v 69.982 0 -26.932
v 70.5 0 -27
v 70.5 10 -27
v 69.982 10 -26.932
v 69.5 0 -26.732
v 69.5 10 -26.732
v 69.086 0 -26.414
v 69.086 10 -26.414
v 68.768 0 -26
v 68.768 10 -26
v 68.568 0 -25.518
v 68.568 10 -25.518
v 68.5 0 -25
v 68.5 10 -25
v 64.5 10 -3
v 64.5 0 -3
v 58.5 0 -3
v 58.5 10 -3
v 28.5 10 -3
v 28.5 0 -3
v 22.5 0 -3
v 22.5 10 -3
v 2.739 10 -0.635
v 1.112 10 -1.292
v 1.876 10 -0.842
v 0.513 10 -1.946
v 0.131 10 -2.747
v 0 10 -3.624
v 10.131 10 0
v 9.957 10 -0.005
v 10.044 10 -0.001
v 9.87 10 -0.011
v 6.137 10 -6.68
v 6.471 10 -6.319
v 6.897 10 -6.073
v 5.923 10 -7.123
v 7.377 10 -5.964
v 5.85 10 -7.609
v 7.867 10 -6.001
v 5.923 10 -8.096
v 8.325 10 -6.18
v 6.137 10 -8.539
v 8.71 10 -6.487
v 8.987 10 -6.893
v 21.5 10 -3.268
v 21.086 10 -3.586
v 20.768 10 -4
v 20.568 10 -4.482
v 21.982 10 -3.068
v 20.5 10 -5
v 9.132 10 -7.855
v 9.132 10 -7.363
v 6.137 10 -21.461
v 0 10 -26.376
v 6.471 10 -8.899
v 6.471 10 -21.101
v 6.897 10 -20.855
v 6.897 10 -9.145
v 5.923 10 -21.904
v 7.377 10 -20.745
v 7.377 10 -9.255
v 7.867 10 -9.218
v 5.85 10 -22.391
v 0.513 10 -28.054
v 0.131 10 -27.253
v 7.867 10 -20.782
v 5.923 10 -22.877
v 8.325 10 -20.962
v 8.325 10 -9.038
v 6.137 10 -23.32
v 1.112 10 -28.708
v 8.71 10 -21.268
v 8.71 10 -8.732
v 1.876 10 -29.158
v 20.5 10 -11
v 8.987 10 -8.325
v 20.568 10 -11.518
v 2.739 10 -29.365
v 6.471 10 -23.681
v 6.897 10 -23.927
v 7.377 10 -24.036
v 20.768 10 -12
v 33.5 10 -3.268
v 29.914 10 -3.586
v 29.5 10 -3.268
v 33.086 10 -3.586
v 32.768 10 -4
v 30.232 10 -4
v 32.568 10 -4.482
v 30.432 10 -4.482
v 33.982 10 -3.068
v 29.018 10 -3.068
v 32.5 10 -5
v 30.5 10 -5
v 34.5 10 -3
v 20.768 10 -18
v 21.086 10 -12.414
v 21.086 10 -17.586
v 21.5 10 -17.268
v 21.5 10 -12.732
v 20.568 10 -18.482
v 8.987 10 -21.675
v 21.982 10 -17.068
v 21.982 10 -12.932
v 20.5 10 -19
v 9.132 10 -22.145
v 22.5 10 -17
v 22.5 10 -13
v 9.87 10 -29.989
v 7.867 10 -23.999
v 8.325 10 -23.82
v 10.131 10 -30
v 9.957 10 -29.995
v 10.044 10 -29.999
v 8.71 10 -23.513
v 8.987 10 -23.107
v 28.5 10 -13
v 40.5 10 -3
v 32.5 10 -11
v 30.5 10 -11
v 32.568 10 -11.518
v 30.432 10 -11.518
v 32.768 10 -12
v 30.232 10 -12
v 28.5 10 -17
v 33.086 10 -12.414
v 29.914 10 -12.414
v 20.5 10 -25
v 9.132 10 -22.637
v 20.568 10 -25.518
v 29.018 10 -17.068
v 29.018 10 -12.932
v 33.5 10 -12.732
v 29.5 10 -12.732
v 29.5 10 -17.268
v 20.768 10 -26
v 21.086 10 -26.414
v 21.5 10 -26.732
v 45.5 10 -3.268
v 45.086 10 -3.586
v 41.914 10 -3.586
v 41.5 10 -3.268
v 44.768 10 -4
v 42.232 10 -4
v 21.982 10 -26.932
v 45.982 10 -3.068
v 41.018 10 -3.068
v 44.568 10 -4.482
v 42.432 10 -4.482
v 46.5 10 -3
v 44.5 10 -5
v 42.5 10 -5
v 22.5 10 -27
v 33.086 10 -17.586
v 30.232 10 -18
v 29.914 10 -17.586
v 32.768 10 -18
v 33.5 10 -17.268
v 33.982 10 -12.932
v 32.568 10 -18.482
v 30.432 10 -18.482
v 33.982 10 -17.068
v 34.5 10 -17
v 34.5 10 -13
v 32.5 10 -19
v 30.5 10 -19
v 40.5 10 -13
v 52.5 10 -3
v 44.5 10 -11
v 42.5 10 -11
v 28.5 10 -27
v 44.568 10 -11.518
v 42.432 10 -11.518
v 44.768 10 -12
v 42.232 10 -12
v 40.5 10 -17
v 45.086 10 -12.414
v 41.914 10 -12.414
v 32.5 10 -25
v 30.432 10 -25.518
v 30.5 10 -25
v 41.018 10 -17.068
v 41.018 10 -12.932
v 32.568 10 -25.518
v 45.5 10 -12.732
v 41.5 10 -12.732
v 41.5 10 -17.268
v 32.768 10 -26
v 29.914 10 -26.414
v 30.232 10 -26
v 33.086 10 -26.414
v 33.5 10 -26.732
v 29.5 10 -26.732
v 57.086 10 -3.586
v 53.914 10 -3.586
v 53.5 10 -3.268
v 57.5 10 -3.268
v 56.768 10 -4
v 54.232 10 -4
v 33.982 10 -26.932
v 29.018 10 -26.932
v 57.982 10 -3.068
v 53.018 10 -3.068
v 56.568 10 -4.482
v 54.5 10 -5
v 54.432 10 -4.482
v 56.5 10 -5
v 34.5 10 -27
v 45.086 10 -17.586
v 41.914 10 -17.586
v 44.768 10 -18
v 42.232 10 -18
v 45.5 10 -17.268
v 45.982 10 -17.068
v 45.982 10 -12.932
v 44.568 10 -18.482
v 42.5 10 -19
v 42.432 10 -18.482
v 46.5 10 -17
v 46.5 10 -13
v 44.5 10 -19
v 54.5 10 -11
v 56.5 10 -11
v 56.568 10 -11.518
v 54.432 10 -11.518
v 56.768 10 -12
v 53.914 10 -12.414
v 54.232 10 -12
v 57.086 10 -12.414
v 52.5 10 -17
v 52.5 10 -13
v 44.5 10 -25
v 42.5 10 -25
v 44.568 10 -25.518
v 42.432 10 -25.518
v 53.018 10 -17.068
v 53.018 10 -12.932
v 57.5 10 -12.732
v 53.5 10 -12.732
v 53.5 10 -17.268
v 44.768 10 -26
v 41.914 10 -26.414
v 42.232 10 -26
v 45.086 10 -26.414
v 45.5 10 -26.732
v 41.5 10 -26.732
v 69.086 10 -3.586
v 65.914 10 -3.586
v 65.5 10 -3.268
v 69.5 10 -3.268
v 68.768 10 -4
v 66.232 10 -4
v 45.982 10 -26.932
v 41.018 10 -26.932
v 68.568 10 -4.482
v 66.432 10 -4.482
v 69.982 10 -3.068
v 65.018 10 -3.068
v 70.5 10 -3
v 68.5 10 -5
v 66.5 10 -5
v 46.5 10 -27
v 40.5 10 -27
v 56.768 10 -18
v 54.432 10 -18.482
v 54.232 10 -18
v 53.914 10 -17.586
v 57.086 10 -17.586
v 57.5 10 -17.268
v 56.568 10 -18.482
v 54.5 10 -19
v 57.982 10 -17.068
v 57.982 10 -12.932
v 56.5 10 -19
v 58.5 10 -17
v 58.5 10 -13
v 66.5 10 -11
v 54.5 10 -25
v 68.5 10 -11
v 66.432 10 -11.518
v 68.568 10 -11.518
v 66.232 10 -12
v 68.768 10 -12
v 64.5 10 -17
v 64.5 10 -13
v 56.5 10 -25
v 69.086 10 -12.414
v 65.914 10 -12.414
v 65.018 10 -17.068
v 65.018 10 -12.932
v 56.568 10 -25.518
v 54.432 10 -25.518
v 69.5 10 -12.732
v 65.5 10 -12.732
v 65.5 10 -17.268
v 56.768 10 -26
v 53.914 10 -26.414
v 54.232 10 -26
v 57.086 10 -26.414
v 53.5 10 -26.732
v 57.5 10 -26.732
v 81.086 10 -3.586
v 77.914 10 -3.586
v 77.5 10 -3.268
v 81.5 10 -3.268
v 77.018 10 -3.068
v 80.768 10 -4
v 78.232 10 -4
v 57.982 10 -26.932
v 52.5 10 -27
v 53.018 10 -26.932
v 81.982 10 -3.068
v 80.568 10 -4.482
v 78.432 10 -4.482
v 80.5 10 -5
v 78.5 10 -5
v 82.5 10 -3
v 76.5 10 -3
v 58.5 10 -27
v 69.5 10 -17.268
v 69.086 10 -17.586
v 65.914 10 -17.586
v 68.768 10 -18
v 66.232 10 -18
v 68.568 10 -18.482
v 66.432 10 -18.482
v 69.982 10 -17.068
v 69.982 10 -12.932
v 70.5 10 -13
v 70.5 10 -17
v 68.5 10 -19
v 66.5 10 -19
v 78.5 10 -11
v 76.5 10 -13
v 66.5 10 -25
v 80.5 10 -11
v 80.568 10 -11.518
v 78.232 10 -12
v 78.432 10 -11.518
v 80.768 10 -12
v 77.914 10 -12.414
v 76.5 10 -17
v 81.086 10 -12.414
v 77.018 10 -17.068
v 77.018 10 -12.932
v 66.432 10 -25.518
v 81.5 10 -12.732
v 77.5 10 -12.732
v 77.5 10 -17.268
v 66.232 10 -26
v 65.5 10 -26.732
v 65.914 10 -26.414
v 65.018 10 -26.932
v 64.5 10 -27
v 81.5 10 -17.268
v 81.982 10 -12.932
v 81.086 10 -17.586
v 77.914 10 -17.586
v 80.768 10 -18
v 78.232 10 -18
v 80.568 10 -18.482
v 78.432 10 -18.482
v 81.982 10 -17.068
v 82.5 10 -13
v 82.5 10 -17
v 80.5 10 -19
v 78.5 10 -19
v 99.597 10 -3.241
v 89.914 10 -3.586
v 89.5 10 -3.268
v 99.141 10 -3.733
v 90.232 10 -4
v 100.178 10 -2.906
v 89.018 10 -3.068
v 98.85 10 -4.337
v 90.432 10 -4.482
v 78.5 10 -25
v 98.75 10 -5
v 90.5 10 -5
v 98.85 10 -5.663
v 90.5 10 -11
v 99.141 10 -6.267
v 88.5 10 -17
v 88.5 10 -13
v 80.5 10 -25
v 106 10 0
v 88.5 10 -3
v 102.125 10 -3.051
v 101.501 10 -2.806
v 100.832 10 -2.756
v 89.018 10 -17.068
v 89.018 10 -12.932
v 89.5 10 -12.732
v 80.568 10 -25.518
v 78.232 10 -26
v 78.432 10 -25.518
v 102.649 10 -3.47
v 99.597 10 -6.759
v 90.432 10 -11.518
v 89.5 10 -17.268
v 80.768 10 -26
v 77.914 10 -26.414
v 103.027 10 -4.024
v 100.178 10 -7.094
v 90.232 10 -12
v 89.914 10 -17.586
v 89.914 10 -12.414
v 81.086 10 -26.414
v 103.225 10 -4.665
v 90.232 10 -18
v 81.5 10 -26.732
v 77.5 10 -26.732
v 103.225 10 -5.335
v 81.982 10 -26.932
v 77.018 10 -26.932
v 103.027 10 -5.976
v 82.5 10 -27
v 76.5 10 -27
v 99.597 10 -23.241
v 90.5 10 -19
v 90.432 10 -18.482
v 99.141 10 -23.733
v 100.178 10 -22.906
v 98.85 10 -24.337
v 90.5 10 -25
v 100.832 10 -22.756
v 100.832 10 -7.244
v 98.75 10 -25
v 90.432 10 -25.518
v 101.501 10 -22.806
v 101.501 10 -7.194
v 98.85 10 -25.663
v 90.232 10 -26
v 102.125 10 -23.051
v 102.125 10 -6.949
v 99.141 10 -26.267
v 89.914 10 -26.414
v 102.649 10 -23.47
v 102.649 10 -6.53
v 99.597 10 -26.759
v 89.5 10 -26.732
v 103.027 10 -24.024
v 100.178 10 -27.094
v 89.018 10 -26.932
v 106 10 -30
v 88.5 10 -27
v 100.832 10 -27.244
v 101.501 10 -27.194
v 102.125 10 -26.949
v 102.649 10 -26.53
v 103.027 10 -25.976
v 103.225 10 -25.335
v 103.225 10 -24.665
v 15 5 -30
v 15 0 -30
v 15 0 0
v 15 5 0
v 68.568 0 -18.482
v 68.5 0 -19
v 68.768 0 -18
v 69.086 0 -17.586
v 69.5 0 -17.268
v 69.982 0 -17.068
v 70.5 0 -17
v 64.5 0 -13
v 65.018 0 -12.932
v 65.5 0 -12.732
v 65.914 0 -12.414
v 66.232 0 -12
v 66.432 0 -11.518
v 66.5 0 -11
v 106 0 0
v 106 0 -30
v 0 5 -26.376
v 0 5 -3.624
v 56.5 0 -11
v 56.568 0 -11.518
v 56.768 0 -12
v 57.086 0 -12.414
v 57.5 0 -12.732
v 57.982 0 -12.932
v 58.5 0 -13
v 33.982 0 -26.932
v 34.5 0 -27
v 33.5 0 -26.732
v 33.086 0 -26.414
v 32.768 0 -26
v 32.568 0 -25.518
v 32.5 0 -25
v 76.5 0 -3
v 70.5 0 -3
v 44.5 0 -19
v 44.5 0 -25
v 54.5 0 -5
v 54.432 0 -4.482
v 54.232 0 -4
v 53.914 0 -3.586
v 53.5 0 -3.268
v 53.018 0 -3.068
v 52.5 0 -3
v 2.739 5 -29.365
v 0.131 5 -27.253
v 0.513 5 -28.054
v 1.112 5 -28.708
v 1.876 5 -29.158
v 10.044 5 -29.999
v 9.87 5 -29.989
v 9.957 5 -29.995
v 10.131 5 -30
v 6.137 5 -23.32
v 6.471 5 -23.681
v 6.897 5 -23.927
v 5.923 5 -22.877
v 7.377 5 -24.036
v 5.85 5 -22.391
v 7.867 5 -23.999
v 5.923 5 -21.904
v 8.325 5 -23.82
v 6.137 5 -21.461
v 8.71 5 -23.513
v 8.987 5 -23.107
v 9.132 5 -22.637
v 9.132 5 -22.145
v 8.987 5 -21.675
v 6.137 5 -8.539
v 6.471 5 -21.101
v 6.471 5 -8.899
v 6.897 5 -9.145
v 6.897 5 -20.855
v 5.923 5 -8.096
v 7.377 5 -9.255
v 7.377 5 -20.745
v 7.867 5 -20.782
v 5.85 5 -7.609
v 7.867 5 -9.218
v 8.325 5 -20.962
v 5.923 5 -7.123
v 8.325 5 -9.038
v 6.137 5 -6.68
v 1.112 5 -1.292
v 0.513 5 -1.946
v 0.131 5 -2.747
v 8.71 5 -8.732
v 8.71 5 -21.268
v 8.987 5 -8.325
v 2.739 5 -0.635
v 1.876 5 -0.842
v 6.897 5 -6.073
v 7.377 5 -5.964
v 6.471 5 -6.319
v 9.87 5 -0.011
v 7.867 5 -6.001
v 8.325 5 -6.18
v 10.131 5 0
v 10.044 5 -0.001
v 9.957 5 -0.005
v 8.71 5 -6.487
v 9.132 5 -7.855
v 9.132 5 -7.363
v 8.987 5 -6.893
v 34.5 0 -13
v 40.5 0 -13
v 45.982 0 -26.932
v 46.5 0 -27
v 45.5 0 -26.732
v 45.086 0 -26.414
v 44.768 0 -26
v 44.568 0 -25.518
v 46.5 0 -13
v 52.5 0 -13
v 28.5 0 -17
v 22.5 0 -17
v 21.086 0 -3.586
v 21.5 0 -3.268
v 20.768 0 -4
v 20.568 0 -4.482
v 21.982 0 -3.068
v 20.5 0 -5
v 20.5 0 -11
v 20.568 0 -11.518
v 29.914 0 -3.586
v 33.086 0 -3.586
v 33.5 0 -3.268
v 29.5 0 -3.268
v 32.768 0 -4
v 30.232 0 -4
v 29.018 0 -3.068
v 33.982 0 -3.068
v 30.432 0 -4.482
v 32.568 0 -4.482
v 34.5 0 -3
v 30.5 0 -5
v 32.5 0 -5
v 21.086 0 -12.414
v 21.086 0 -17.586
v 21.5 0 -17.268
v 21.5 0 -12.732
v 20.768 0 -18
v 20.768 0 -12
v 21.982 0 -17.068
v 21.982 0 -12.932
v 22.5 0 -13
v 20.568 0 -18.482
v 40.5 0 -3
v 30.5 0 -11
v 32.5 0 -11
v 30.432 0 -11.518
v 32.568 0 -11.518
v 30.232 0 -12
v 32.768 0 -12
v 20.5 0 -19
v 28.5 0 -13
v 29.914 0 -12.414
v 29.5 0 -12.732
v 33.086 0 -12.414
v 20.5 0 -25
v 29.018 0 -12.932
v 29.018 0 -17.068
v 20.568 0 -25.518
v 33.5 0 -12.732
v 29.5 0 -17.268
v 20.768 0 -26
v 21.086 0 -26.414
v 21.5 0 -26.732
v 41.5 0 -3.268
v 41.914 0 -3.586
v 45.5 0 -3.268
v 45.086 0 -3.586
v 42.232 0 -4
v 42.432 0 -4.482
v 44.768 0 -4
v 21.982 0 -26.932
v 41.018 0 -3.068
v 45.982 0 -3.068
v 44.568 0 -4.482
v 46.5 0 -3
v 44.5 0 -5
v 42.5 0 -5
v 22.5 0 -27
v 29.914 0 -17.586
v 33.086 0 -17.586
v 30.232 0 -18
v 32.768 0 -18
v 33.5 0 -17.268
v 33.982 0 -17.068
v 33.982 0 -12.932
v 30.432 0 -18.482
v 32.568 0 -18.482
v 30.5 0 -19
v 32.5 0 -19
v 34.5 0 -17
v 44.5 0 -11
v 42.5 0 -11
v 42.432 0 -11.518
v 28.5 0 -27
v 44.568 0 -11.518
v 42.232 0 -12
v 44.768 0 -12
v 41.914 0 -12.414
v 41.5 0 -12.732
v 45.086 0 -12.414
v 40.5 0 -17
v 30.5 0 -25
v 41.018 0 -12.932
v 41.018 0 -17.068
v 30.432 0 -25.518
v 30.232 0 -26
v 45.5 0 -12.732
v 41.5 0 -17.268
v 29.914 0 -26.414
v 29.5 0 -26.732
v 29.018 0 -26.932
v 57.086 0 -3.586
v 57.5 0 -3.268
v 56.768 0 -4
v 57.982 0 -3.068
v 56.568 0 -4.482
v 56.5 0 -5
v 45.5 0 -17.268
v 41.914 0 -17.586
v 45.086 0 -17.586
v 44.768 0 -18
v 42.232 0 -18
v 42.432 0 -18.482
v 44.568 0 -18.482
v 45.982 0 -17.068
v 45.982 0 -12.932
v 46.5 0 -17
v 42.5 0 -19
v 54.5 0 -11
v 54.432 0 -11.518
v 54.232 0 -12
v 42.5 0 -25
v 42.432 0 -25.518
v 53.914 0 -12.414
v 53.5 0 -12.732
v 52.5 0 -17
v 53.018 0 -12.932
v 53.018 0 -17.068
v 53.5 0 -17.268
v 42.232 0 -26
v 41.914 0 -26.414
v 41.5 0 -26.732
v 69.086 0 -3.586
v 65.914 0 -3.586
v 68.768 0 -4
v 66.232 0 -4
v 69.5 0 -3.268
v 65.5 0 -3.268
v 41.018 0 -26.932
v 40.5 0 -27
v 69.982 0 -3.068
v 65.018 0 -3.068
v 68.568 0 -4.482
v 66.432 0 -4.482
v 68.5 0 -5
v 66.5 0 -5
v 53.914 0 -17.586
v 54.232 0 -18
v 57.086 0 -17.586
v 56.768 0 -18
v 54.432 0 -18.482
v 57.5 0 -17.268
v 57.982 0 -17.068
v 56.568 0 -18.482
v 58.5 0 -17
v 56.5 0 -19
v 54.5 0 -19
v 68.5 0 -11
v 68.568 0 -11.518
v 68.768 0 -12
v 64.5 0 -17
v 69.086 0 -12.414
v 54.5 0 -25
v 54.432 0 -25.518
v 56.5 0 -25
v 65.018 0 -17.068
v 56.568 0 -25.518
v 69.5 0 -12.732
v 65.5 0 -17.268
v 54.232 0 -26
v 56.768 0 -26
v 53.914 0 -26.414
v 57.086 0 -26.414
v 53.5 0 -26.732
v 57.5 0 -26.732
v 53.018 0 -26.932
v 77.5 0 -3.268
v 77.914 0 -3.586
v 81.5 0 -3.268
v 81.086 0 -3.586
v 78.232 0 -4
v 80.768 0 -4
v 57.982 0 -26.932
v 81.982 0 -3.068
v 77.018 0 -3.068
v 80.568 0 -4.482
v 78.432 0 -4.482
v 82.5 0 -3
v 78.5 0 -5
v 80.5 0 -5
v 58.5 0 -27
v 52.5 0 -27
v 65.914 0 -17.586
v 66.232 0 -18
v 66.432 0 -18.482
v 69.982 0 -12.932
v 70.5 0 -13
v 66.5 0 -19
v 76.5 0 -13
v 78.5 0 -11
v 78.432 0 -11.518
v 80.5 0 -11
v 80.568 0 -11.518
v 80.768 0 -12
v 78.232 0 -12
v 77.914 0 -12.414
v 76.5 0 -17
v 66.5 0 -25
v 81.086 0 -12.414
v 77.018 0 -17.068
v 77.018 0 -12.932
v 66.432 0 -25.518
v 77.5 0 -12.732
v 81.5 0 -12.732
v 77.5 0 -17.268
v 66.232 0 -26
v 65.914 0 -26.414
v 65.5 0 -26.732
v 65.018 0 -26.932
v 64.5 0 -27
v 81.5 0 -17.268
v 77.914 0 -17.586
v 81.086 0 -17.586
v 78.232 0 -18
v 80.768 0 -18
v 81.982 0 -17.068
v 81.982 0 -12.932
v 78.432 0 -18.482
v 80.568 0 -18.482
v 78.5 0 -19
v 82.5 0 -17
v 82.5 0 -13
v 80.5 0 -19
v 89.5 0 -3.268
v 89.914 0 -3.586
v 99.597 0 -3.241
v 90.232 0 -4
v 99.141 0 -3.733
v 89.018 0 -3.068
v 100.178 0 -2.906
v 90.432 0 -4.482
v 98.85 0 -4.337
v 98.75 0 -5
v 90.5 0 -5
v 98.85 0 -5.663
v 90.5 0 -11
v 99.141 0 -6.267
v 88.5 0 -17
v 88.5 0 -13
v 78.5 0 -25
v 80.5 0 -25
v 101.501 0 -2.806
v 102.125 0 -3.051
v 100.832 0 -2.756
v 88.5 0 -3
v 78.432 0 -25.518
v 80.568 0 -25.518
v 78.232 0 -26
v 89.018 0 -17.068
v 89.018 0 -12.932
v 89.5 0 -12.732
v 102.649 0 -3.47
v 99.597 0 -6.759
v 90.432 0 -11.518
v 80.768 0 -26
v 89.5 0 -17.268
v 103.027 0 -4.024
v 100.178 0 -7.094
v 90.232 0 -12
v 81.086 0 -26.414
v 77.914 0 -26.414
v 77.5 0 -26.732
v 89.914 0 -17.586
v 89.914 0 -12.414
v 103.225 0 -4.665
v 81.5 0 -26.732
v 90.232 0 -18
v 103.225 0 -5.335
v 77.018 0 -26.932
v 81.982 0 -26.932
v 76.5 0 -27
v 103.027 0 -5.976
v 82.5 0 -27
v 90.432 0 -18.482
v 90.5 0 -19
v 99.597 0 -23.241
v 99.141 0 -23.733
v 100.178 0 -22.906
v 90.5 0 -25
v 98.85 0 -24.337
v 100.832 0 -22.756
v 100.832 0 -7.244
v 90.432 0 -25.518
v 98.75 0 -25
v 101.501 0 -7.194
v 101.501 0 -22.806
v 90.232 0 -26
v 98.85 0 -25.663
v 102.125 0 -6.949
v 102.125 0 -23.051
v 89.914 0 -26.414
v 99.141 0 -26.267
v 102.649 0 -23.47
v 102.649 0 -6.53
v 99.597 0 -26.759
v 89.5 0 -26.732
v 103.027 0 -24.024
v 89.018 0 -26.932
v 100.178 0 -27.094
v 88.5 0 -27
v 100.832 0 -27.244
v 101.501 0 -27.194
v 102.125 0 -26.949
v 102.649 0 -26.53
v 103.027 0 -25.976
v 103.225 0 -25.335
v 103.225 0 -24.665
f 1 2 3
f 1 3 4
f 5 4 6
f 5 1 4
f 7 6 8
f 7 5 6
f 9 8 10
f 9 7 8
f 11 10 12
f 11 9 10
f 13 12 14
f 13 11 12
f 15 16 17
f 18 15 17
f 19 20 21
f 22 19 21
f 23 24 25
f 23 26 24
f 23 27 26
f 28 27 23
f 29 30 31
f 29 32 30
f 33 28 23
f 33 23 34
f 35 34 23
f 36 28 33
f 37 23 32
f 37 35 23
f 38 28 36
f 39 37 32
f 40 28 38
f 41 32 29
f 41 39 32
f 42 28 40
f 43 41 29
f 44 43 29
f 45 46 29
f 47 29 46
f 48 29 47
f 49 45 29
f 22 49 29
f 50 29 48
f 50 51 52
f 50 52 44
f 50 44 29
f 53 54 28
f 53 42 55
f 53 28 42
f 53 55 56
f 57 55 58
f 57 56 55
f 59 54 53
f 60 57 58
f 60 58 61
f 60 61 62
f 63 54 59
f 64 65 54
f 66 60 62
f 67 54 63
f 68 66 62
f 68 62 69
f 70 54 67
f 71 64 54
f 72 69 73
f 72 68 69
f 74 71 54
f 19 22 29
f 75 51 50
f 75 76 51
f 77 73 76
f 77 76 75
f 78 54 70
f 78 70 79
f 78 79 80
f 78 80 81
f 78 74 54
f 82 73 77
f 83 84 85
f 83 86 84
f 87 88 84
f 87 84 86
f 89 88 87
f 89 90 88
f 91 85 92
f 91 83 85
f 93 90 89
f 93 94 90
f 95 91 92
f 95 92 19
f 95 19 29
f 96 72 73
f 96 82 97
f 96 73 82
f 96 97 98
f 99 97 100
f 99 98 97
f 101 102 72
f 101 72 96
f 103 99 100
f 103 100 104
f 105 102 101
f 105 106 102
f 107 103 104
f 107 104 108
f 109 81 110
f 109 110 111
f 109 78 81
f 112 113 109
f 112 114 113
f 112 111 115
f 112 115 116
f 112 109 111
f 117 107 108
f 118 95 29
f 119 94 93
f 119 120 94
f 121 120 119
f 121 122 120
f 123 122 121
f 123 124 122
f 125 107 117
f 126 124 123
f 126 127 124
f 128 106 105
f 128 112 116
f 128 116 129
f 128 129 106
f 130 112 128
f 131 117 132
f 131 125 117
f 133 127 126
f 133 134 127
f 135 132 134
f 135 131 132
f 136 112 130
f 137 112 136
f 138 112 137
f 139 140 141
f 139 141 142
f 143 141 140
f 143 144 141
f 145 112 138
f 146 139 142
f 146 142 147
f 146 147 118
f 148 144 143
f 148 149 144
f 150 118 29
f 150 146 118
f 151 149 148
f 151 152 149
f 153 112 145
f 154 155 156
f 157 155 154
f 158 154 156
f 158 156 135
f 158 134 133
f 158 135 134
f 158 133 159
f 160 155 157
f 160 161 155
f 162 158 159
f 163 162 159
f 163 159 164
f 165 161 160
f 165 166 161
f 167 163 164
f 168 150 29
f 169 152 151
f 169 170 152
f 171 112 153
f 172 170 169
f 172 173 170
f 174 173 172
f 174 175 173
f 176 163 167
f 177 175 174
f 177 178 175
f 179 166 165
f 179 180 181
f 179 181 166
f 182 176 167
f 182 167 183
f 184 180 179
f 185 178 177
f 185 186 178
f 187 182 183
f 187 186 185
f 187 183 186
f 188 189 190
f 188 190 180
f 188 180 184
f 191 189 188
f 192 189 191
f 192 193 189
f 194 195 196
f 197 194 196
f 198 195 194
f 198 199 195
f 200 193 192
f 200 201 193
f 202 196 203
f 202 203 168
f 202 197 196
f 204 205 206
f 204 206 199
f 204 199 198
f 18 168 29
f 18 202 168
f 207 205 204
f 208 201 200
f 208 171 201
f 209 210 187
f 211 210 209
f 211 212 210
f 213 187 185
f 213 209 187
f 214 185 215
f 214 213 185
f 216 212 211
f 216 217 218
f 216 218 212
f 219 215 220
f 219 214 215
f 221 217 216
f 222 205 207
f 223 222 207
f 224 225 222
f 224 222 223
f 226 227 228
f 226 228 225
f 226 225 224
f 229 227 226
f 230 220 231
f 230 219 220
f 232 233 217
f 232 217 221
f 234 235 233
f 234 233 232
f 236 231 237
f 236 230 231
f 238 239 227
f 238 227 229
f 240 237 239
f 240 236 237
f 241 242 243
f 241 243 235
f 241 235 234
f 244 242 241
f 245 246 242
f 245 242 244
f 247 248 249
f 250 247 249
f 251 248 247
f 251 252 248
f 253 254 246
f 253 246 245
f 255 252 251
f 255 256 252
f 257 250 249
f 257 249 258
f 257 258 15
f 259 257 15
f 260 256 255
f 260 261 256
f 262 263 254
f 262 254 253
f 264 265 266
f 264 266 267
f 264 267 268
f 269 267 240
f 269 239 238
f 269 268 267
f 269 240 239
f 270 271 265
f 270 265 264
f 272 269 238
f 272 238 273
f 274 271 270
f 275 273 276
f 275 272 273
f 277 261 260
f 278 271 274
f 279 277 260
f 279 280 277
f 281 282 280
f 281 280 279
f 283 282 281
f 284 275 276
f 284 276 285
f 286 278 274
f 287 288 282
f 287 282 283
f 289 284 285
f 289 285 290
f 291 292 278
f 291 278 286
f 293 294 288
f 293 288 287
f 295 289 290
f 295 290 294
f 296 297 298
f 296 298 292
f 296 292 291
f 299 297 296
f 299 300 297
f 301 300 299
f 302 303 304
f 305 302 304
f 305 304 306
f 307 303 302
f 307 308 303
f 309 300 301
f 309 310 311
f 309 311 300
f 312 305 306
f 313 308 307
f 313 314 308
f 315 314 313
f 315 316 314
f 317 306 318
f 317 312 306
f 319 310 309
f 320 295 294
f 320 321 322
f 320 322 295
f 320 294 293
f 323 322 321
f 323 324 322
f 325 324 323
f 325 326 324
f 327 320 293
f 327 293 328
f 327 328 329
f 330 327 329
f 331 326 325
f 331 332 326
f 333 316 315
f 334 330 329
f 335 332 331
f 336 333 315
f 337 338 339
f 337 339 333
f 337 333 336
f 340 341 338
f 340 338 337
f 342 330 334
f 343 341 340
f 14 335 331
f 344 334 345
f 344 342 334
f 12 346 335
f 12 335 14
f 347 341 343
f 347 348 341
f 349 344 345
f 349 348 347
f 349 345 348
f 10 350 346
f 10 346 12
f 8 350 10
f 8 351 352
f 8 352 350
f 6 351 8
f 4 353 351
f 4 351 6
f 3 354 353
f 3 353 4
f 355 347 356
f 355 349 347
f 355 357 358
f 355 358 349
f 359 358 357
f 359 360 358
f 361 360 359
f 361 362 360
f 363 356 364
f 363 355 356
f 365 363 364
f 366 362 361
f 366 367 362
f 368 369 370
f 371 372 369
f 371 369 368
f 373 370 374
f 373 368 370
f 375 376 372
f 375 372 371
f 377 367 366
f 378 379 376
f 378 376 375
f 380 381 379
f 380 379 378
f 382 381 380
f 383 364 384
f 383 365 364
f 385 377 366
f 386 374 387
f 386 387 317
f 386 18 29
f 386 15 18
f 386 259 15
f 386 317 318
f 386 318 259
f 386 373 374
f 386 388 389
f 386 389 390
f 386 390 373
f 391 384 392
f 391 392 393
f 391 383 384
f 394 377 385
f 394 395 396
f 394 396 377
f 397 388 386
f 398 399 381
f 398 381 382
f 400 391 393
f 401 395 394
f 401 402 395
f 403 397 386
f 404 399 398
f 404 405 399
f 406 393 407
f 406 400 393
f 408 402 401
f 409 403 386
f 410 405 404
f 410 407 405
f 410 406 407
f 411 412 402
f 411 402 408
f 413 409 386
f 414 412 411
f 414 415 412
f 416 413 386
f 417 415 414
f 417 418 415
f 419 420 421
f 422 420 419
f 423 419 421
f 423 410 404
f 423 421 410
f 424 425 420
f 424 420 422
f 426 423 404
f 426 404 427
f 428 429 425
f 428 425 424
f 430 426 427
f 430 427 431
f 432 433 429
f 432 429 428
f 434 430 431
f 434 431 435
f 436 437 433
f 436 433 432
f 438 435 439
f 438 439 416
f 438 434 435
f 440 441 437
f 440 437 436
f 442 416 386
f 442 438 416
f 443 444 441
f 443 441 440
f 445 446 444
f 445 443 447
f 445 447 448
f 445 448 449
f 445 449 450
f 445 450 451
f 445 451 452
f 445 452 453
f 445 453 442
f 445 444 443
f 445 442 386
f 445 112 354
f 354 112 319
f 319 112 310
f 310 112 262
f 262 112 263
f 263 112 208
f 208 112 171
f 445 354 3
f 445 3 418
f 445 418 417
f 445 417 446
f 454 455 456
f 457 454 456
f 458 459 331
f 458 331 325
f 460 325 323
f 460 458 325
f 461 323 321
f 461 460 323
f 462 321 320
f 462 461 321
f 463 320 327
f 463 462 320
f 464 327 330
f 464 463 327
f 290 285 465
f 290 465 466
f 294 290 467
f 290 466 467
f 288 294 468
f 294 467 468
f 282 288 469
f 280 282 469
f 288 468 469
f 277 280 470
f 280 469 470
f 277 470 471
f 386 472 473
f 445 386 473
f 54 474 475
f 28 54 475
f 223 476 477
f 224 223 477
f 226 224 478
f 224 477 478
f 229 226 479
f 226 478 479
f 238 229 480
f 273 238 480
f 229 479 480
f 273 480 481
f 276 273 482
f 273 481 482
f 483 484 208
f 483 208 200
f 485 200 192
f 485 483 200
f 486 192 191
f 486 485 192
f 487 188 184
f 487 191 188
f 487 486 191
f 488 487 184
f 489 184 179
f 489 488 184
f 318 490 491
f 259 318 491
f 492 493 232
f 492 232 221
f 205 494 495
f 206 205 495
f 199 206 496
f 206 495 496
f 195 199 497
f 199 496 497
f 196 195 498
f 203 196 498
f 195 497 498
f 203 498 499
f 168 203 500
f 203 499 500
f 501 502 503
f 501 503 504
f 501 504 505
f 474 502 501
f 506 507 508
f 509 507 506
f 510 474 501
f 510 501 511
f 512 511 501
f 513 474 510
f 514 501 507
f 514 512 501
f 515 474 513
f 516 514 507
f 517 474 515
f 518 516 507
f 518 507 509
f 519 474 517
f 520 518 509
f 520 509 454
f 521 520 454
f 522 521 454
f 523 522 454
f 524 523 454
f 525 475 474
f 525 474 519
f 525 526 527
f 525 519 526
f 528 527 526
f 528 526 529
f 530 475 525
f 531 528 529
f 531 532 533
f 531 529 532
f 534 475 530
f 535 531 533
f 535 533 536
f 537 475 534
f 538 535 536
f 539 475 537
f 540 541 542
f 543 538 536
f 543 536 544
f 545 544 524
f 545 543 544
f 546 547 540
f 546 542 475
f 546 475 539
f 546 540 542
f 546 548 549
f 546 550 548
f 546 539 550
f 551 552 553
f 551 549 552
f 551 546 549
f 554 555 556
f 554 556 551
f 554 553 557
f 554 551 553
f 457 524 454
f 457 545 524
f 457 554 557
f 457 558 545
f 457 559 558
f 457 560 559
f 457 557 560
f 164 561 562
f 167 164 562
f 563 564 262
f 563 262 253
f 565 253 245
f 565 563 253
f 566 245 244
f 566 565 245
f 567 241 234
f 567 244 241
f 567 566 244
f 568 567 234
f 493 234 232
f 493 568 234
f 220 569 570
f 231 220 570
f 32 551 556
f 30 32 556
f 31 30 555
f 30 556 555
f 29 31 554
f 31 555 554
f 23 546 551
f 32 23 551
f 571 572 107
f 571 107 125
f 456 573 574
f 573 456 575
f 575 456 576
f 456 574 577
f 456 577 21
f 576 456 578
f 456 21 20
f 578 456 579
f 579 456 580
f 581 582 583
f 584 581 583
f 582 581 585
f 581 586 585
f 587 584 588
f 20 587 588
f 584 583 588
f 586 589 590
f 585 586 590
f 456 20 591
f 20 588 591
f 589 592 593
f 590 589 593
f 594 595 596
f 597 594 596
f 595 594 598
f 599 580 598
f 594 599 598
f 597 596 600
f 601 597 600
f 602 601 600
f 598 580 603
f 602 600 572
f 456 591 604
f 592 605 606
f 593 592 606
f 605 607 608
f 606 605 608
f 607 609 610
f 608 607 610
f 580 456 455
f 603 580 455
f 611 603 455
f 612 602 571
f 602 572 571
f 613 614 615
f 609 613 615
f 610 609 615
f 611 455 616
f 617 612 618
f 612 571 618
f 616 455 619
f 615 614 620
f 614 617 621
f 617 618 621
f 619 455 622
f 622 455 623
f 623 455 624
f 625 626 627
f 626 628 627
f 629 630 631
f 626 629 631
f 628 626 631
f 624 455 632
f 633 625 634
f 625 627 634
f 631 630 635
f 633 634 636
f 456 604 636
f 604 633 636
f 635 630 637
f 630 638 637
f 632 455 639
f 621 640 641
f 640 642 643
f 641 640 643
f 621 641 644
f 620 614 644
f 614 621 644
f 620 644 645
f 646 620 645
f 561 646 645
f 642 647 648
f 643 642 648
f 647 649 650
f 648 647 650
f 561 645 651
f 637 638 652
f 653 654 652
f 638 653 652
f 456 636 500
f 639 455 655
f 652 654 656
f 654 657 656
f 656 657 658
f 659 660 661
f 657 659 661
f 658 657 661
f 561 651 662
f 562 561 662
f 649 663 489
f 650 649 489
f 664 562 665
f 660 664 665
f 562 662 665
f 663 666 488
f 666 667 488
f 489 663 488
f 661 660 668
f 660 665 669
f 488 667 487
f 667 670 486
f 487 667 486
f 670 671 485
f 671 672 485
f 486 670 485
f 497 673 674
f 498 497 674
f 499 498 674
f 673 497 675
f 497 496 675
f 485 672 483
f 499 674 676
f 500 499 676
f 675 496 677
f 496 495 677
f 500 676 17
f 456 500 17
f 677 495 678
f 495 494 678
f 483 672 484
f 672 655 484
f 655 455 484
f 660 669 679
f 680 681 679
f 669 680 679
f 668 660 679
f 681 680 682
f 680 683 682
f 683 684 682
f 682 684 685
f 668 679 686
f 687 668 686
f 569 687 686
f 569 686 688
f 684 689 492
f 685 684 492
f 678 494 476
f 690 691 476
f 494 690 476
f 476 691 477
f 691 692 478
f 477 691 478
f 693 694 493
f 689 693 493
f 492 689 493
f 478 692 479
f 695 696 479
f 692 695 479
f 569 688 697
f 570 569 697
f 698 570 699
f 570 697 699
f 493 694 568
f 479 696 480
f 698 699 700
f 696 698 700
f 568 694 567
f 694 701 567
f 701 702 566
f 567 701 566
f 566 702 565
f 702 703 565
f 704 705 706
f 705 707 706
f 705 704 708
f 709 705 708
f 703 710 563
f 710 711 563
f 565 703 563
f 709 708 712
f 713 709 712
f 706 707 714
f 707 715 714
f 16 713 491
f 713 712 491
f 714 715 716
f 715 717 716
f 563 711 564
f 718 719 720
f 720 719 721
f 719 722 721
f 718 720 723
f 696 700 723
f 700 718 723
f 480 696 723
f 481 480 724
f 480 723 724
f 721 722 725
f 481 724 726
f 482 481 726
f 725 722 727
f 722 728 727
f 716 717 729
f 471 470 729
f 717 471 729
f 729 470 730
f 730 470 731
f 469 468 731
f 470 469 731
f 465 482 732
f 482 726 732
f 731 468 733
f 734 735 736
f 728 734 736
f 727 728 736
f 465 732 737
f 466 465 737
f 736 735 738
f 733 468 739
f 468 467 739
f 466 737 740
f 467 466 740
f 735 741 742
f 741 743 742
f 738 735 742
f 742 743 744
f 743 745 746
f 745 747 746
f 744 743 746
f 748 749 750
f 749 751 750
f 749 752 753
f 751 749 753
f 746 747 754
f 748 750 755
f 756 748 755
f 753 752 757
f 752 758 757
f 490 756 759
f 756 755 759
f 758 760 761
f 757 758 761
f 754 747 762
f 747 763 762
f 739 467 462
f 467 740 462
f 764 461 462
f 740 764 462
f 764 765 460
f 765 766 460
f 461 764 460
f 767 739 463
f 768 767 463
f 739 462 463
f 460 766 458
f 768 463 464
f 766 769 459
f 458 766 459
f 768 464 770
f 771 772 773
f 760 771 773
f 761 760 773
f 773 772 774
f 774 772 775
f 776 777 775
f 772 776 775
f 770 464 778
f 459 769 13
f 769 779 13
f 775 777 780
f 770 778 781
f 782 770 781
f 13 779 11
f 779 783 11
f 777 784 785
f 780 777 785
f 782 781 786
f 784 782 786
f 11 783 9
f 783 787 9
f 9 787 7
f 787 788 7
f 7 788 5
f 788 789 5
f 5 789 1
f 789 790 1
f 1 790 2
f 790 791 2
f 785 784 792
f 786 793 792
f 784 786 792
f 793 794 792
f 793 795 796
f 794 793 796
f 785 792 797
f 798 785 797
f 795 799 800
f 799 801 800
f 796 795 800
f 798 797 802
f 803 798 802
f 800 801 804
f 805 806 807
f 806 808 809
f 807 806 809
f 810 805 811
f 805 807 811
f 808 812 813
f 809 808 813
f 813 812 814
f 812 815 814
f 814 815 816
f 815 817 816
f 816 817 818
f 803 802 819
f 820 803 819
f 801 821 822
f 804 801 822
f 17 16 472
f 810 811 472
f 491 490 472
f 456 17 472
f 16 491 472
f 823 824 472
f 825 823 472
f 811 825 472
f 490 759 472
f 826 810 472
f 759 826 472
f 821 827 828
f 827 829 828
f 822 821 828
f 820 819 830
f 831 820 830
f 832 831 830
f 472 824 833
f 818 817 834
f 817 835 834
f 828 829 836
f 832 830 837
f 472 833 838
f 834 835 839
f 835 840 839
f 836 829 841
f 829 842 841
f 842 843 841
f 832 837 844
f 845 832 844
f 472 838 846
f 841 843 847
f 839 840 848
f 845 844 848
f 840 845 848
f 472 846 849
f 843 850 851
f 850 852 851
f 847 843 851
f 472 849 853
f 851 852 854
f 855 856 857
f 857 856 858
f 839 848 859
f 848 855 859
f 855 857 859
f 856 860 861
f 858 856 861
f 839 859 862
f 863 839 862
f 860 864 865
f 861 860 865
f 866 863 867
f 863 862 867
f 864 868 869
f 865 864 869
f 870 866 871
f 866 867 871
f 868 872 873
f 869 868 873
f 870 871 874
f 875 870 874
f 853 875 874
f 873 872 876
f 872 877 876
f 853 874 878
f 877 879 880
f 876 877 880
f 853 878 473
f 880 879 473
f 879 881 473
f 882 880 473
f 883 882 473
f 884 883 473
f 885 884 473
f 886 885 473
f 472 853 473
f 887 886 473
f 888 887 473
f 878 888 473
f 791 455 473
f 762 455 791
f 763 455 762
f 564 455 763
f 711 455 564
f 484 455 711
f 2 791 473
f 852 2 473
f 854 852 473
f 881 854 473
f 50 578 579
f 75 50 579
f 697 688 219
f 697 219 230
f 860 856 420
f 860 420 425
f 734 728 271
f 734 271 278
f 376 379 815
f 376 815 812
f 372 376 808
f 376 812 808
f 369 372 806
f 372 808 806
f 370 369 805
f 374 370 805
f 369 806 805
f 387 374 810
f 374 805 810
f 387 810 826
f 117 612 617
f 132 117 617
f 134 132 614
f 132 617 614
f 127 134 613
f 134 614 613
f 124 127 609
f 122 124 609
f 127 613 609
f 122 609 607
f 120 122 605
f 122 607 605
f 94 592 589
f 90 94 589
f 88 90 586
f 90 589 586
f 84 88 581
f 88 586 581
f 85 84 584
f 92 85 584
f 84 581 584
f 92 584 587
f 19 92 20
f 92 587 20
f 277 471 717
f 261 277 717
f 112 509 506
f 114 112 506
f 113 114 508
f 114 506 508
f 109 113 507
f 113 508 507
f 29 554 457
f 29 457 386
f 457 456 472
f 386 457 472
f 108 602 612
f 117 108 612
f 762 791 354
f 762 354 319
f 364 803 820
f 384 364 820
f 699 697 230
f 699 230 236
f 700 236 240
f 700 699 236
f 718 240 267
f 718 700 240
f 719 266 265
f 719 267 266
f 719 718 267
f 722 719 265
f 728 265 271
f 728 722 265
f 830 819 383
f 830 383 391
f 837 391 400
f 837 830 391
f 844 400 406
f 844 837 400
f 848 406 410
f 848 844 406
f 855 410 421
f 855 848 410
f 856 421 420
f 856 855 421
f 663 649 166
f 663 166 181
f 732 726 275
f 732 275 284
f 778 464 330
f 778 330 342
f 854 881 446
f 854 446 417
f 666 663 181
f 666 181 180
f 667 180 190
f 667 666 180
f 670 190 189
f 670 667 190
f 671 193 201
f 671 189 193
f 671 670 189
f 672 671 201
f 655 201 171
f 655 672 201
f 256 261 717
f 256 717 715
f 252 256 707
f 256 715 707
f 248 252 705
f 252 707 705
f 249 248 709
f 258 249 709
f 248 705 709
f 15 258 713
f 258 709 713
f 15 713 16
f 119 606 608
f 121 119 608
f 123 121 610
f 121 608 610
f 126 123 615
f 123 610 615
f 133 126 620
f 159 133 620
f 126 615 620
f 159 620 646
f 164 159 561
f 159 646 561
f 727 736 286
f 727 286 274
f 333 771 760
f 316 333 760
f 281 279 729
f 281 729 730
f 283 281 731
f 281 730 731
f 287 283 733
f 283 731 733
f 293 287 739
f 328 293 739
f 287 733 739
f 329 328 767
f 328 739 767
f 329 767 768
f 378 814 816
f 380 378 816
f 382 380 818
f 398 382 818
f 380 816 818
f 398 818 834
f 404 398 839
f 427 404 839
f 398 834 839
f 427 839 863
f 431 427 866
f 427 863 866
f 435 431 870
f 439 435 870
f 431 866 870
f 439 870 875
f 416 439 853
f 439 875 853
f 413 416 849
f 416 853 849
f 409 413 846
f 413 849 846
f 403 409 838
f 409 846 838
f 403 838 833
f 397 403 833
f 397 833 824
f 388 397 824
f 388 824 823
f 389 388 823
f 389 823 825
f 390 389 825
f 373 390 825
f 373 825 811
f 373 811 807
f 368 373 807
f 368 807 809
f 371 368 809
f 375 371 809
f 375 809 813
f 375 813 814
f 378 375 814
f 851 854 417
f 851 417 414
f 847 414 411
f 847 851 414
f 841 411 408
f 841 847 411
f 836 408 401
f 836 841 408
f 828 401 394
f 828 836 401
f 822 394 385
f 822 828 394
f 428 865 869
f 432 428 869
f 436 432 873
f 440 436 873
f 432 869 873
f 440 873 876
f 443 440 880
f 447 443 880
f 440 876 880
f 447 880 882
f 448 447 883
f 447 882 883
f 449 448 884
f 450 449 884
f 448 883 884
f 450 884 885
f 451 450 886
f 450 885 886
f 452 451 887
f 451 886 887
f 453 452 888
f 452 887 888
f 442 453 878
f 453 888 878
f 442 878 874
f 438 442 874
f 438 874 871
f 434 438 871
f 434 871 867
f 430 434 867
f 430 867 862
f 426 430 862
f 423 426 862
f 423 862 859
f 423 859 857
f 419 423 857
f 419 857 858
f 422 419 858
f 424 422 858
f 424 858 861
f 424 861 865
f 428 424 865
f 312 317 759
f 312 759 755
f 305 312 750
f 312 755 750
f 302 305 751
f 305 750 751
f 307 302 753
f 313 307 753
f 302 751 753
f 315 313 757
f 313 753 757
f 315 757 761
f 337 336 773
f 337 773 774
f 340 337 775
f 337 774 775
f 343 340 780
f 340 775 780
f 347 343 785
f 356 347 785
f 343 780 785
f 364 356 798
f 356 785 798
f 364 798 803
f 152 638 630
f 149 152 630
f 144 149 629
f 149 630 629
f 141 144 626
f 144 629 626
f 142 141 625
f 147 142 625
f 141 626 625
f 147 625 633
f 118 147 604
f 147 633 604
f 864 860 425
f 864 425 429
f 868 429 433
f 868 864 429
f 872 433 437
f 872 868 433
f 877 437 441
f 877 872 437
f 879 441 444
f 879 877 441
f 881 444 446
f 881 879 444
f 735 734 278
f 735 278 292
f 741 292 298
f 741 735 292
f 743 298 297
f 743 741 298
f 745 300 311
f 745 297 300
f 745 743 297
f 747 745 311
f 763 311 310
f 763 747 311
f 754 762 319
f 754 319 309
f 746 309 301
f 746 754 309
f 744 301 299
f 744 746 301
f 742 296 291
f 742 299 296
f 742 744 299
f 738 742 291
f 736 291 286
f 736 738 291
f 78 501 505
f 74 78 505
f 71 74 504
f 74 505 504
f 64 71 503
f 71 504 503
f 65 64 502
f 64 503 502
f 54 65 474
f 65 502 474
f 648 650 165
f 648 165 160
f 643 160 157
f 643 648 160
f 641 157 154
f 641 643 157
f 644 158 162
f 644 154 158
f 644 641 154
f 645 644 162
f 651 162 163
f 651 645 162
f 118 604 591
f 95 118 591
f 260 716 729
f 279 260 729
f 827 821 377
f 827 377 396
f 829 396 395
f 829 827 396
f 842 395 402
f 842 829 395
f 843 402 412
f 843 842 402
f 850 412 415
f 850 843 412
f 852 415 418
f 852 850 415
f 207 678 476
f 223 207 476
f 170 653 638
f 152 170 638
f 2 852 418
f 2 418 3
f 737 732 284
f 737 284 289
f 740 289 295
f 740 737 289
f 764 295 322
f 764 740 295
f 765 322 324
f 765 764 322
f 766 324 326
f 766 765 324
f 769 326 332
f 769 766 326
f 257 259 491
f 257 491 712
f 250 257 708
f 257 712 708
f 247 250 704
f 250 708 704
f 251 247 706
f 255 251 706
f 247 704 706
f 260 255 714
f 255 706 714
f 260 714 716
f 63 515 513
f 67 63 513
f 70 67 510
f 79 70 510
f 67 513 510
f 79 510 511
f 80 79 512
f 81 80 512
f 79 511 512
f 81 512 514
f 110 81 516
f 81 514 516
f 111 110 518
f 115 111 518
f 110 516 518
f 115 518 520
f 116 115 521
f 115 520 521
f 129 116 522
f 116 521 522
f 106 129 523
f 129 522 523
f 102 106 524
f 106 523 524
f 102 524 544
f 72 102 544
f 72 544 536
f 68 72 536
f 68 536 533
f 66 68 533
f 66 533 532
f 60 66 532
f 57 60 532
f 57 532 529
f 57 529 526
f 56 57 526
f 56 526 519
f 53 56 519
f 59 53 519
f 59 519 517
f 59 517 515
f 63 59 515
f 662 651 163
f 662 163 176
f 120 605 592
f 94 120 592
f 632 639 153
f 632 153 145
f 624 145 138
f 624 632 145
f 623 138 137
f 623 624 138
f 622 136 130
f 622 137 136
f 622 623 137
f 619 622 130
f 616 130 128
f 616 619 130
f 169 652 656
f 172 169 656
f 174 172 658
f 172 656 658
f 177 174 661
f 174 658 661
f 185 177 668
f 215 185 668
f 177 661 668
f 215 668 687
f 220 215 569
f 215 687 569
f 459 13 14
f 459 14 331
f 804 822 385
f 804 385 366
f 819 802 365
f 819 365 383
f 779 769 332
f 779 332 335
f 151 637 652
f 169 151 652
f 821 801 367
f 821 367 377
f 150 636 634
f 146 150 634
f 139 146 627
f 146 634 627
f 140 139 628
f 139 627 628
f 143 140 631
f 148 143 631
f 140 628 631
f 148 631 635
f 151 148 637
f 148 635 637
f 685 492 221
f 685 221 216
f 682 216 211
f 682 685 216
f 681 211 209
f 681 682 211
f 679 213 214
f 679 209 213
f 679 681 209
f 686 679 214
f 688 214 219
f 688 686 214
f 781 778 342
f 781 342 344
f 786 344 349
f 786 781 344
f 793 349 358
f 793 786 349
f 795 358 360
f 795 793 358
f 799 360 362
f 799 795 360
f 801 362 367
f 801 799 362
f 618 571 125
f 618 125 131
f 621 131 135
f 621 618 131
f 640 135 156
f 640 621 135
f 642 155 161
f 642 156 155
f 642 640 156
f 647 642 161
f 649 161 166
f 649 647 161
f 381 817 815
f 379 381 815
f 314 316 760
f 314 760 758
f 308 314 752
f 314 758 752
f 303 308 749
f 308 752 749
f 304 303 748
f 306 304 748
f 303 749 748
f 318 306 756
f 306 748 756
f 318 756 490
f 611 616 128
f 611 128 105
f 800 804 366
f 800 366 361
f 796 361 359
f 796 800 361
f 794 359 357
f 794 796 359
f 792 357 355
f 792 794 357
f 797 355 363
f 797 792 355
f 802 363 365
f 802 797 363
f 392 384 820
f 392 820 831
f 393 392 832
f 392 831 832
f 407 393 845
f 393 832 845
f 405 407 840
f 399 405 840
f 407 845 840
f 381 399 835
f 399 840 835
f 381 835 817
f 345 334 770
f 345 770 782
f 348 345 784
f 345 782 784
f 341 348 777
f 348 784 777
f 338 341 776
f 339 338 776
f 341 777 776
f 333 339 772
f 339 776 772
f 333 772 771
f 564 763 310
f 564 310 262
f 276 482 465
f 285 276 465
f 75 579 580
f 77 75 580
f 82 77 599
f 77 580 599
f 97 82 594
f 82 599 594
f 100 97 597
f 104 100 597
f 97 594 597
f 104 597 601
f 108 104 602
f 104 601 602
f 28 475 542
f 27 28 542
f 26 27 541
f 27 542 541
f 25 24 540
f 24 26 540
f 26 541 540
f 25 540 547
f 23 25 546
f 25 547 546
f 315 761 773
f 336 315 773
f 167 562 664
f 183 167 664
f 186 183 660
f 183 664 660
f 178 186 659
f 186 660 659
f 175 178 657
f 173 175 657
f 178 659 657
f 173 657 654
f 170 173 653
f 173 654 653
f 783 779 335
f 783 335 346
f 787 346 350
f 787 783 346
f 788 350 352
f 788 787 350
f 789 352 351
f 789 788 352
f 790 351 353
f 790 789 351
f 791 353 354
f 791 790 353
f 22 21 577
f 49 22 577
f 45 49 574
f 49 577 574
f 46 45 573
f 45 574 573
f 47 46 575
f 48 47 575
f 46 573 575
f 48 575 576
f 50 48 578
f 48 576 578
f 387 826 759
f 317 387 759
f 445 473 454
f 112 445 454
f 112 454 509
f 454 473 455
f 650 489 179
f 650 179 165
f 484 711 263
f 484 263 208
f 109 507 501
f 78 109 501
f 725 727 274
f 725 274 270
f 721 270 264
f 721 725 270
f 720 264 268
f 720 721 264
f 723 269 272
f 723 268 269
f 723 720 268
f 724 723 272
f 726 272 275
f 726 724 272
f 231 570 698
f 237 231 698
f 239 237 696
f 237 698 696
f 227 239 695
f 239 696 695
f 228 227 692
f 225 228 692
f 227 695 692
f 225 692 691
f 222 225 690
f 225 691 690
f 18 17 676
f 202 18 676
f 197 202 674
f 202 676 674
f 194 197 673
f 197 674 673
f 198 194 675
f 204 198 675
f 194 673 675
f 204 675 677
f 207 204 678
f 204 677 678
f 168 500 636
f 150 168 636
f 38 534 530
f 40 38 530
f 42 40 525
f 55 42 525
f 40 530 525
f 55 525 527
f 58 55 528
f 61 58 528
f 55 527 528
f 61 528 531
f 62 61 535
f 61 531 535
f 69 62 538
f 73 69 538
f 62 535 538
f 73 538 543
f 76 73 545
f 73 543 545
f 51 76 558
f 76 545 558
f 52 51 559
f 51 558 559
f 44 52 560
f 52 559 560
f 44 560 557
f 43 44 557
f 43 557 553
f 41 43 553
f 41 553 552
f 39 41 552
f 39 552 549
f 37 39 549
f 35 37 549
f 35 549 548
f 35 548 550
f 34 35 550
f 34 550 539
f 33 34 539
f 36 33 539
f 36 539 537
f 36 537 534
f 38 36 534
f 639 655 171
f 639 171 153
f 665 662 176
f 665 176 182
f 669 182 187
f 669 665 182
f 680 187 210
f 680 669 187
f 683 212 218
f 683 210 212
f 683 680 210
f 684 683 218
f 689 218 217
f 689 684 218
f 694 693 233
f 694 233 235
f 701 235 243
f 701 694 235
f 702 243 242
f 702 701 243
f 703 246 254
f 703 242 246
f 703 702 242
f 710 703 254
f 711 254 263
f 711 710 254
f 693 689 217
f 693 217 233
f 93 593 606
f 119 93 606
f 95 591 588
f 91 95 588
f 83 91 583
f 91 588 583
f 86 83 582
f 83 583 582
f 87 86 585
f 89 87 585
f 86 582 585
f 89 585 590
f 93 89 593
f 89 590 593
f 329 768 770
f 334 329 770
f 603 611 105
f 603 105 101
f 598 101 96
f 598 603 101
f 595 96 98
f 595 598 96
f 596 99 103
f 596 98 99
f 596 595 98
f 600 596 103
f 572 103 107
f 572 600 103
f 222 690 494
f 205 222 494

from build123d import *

# Parameters (mm, degrees)
EXTRUDE_1_DEPTH     = 10
SKETCH_4_W          = 15
SKETCH_4_H          = 30
CUT_EXTRUDE_2_DEPTH = 5
FILLET_1_R          = 3
CUT_EXTRUDE_3_DEPTH = 111.616454472
HOLE_WIZARD_M41_D   = 4.5
M4X0_72_D           = 3.3


with BuildPart() as part:
    # Эскиз1 → Бобышка-Вытянуть1 (new body)
    with BuildSketch(Plane(origin=(0, 0, 0), x_dir=(1, 0, 0), z_dir=(0, 1, 0))):
        Polygon((15, 0), (106, 0), (106, 30), (15, 30), (10, 30), (0, 29.125113365), (0, 0.874886635), (10, 0), align=None)
    extrude(amount=EXTRUDE_1_DEPTH)

    # Эскиз4 → Вырез-Вытянуть2 (cut)
    with BuildSketch(Plane.XZ):
        with Locations((7.5, -15)):
            Rectangle(SKETCH_4_W, SKETCH_4_H)
    extrude(amount=-CUT_EXTRUDE_2_DEPTH, mode=Mode.SUBTRACT)

    # Скругление1
    # the kernel refuses this fillet: 3 mm, written as the material it takes off along each edge
    with BuildSketch(Plane(origin=(10, 4.672542928, 0), x_dir=(1, 0, 0), z_dir=(0, 1, 0))) as fillet_1_piece_1:
        with BuildLine():
            CenterArc((FILLET_1_R * 0.0436609429085, FILLET_1_R), FILLET_1_R, 265, 5)
            Line((-FILLET_1_R * 0.0434947998391, FILLET_1_R * 0.00380530190825), (0, 0))
            Line((0, 0), (FILLET_1_R * 0.0436609429085, 0))
        make_face()
    extrude(amount=5.654914144, mode=Mode.SUBTRACT)
    with BuildSketch(Plane(origin=(0, -1.872483805, -0.874886635), x_dir=(0.9961946980917452, 0, 0.08715574274766158), z_dir=(0, 1, 0))) as fillet_1_piece_2:
        with BuildLine():
            CenterArc((FILLET_1_R * 0.916331174017, FILLET_1_R), FILLET_1_R, 185, 85)
            Line((-FILLET_1_R * 0.0798635240743, FILLET_1_R * 0.912844257252), (0, 0))
            Line((0, 0), (FILLET_1_R * 0.916331174017, 0))
        make_face()
    extrude(amount=18.74496761, mode=Mode.SUBTRACT)
    with BuildSketch(Plane(origin=(0, -1.872483805, -29.125113365), x_dir=(0.9961946980917452, 0, -0.08715574274766201), z_dir=(0, 1, 0))) as fillet_1_piece_3:
        with BuildLine():
            CenterArc((FILLET_1_R * 0.916331174017, -FILLET_1_R), FILLET_1_R, 90, 85)
            Line((-FILLET_1_R * 0.0798635240743, -FILLET_1_R * 0.912844257252), (0, 0))
            Line((0, 0), (FILLET_1_R * 0.916331174017, 0))
        make_face()
    extrude(amount=18.74496761, mode=Mode.SUBTRACT)
    with BuildSketch(Plane(origin=(10, 4.672542928, -30), x_dir=(1, 0, 0), z_dir=(0, 1, 0))) as fillet_1_piece_4:
        with BuildLine():
            CenterArc((FILLET_1_R * 0.0436609429085, -FILLET_1_R), FILLET_1_R, 90, 5)
            Line((-FILLET_1_R * 0.0434947998391, -FILLET_1_R * 0.00380530190825), (0, 0))
            Line((0, 0), (FILLET_1_R * 0.0436609429085, 0))
        make_face()
    extrude(amount=5.654914144, mode=Mode.SUBTRACT)

    # Эскиз5 → Вырез-Вытянуть3 (cut, through all)
    with BuildSketch(Plane.XZ):
        with BuildLine():
            Line((22.5, -17), (28.5, -17))
            ThreePointArc((28.5, -17), (29.914213562, -17.585786438), (30.5, -19))
            Line((30.5, -19), (30.5, -25))
            ThreePointArc((30.5, -25), (29.914213562, -26.414213562), (28.5, -27))
            Line((28.5, -27), (22.5, -27))
            ThreePointArc((22.5, -27), (21.085786438, -26.414213562), (20.5, -25))
            Line((20.5, -25), (20.5, -19))
            ThreePointArc((20.5, -19), (21.085786438, -17.585786438), (22.5, -17))
        make_face()
        with BuildLine():
            Line((34.5, -17), (40.5, -17))
            ThreePointArc((40.5, -17), (41.914213562, -17.585786438), (42.5, -19))
            Line((42.5, -19), (42.5, -25))
            ThreePointArc((42.5, -25), (41.914213562, -26.414213562), (40.5, -27))
            Line((40.5, -27), (34.5, -27))
            ThreePointArc((34.5, -27), (33.085786438, -26.414213562), (32.5, -25))
            Line((32.5, -25), (32.5, -19))
            ThreePointArc((32.5, -19), (33.085786438, -17.585786438), (34.5, -17))
        make_face()
        with BuildLine():
            Line((46.5, -17), (52.5, -17))
            ThreePointArc((52.5, -17), (53.914213562, -17.585786438), (54.5, -19))
            Line((54.5, -19), (54.5, -25))
            ThreePointArc((54.5, -25), (53.914213562, -26.414213562), (52.5, -27))
            Line((52.5, -27), (46.5, -27))
            ThreePointArc((46.5, -27), (45.085786438, -26.414213562), (44.5, -25))
            Line((44.5, -25), (44.5, -19))
            ThreePointArc((44.5, -19), (45.085786438, -17.585786438), (46.5, -17))
        make_face()
        with BuildLine():
            Line((58.5, -17), (64.5, -17))
            ThreePointArc((64.5, -17), (65.914213562, -17.585786438), (66.5, -19))
            Line((66.5, -19), (66.5, -25))
            ThreePointArc((66.5, -25), (65.914213562, -26.414213562), (64.5, -27))
            Line((64.5, -27), (58.5, -27))
            ThreePointArc((58.5, -27), (57.085786438, -26.414213562), (56.5, -25))
            Line((56.5, -25), (56.5, -19))
            ThreePointArc((56.5, -19), (57.085786438, -17.585786438), (58.5, -17))
        make_face()
        with BuildLine():
            Line((70.5, -17), (76.5, -17))
            ThreePointArc((76.5, -17), (77.914213562, -17.585786438), (78.5, -19))
            Line((78.5, -19), (78.5, -25))
            ThreePointArc((78.5, -25), (77.914213562, -26.414213562), (76.5, -27))
            Line((76.5, -27), (70.5, -27))
            ThreePointArc((70.5, -27), (69.085786438, -26.414213562), (68.5, -25))
            Line((68.5, -25), (68.5, -19))
            ThreePointArc((68.5, -19), (69.085786438, -17.585786438), (70.5, -17))
        make_face()
        with BuildLine():
            Line((82.5, -17), (88.5, -17))
            ThreePointArc((88.5, -17), (89.914213562, -17.585786438), (90.5, -19))
            Line((90.5, -19), (90.5, -25))
            ThreePointArc((90.5, -25), (89.914213562, -26.414213562), (88.5, -27))
            Line((88.5, -27), (82.5, -27))
            ThreePointArc((82.5, -27), (81.085786438, -26.414213562), (80.5, -25))
            Line((80.5, -25), (80.5, -19))
            ThreePointArc((80.5, -19), (81.085786438, -17.585786438), (82.5, -17))
        make_face()
        with BuildLine():
            Line((90.5, -11), (90.5, -5))
            ThreePointArc((90.5, -5), (89.914213562, -3.585786438), (88.5, -3))
            Line((88.5, -3), (82.5, -3))
            ThreePointArc((82.5, -3), (81.085786438, -3.585786438), (80.5, -5))
            Line((80.5, -5), (80.5, -11))
            ThreePointArc((80.5, -11), (81.085786438, -12.414213562), (82.5, -13))
            Line((82.5, -13), (88.5, -13))
            ThreePointArc((88.5, -13), (89.914213562, -12.414213562), (90.5, -11))
        make_face()
        with BuildLine():
            Line((78.5, -11), (78.5, -5))
            ThreePointArc((78.5, -5), (77.914213562, -3.585786438), (76.5, -3))
            Line((76.5, -3), (70.5, -3))
            ThreePointArc((70.5, -3), (69.085786438, -3.585786438), (68.5, -5))
            Line((68.5, -5), (68.5, -11))
            ThreePointArc((68.5, -11), (69.085786438, -12.414213562), (70.5, -13))
            Line((70.5, -13), (76.5, -13))
            ThreePointArc((76.5, -13), (77.914213562, -12.414213562), (78.5, -11))
        make_face()
        with BuildLine():
            Line((66.5, -11), (66.5, -5))
            ThreePointArc((66.5, -5), (65.914213562, -3.585786438), (64.5, -3))
            Line((64.5, -3), (58.5, -3))
            ThreePointArc((58.5, -3), (57.085786438, -3.585786438), (56.5, -5))
            Line((56.5, -5), (56.5, -11))
            ThreePointArc((56.5, -11), (57.085786438, -12.414213562), (58.5, -13))
            Line((58.5, -13), (64.5, -13))
            ThreePointArc((64.5, -13), (65.914213562, -12.414213562), (66.5, -11))
        make_face()
        with BuildLine():
            Line((54.5, -11), (54.5, -5))
            ThreePointArc((54.5, -5), (53.914213562, -3.585786438), (52.5, -3))
            Line((52.5, -3), (46.5, -3))
            ThreePointArc((46.5, -3), (45.085786438, -3.585786438), (44.5, -5))
            Line((44.5, -5), (44.5, -11))
            ThreePointArc((44.5, -11), (45.085786438, -12.414213562), (46.5, -13))
            Line((46.5, -13), (52.5, -13))
            ThreePointArc((52.5, -13), (53.914213562, -12.414213562), (54.5, -11))
        make_face()
        with BuildLine():
            Line((42.5, -11), (42.5, -5))
            ThreePointArc((42.5, -5), (41.914213562, -3.585786438), (40.5, -3))
            Line((40.5, -3), (34.5, -3))
            ThreePointArc((34.5, -3), (33.085786438, -3.585786438), (32.5, -5))
            Line((32.5, -5), (32.5, -11))
            ThreePointArc((32.5, -11), (33.085786438, -12.414213562), (34.5, -13))
            Line((34.5, -13), (40.5, -13))
            ThreePointArc((40.5, -13), (41.914213562, -12.414213562), (42.5, -11))
        make_face()
        with BuildLine():
            Line((30.5, -11), (30.5, -5))
            ThreePointArc((30.5, -5), (29.914213562, -3.585786438), (28.5, -3))
            Line((28.5, -3), (22.5, -3))
            ThreePointArc((22.5, -3), (21.085786438, -3.585786438), (20.5, -5))
            Line((20.5, -5), (20.5, -11))
            ThreePointArc((20.5, -11), (21.085786438, -12.414213562), (22.5, -13))
            Line((22.5, -13), (28.5, -13))
            ThreePointArc((28.5, -13), (29.914213562, -12.414213562), (30.5, -11))
        make_face()
    extrude(amount=-CUT_EXTRUDE_3_DEPTH, mode=Mode.SUBTRACT)

    # Отверстие с зазором M41 (through all)
    with Locations(Plane(origin=(0, 10, 0), x_dir=(1, 0, 0), z_dir=(0, 1, 0))):
        with Locations((101, 25), (101, 5)):
            Hole(HOLE_WIZARD_M41_D / 2)

    # Отверстие обработанное метчиком M4x0.72 (through all)
    with Locations(Plane(origin=(0, 10, 0), x_dir=(1, 0, 0), z_dir=(0, 1, 0))):
        with Locations((7.5, 22.390639171), (7.5, 7.609360829)):
            Hole(M4X0_72_D / 2)


solid = part.part
